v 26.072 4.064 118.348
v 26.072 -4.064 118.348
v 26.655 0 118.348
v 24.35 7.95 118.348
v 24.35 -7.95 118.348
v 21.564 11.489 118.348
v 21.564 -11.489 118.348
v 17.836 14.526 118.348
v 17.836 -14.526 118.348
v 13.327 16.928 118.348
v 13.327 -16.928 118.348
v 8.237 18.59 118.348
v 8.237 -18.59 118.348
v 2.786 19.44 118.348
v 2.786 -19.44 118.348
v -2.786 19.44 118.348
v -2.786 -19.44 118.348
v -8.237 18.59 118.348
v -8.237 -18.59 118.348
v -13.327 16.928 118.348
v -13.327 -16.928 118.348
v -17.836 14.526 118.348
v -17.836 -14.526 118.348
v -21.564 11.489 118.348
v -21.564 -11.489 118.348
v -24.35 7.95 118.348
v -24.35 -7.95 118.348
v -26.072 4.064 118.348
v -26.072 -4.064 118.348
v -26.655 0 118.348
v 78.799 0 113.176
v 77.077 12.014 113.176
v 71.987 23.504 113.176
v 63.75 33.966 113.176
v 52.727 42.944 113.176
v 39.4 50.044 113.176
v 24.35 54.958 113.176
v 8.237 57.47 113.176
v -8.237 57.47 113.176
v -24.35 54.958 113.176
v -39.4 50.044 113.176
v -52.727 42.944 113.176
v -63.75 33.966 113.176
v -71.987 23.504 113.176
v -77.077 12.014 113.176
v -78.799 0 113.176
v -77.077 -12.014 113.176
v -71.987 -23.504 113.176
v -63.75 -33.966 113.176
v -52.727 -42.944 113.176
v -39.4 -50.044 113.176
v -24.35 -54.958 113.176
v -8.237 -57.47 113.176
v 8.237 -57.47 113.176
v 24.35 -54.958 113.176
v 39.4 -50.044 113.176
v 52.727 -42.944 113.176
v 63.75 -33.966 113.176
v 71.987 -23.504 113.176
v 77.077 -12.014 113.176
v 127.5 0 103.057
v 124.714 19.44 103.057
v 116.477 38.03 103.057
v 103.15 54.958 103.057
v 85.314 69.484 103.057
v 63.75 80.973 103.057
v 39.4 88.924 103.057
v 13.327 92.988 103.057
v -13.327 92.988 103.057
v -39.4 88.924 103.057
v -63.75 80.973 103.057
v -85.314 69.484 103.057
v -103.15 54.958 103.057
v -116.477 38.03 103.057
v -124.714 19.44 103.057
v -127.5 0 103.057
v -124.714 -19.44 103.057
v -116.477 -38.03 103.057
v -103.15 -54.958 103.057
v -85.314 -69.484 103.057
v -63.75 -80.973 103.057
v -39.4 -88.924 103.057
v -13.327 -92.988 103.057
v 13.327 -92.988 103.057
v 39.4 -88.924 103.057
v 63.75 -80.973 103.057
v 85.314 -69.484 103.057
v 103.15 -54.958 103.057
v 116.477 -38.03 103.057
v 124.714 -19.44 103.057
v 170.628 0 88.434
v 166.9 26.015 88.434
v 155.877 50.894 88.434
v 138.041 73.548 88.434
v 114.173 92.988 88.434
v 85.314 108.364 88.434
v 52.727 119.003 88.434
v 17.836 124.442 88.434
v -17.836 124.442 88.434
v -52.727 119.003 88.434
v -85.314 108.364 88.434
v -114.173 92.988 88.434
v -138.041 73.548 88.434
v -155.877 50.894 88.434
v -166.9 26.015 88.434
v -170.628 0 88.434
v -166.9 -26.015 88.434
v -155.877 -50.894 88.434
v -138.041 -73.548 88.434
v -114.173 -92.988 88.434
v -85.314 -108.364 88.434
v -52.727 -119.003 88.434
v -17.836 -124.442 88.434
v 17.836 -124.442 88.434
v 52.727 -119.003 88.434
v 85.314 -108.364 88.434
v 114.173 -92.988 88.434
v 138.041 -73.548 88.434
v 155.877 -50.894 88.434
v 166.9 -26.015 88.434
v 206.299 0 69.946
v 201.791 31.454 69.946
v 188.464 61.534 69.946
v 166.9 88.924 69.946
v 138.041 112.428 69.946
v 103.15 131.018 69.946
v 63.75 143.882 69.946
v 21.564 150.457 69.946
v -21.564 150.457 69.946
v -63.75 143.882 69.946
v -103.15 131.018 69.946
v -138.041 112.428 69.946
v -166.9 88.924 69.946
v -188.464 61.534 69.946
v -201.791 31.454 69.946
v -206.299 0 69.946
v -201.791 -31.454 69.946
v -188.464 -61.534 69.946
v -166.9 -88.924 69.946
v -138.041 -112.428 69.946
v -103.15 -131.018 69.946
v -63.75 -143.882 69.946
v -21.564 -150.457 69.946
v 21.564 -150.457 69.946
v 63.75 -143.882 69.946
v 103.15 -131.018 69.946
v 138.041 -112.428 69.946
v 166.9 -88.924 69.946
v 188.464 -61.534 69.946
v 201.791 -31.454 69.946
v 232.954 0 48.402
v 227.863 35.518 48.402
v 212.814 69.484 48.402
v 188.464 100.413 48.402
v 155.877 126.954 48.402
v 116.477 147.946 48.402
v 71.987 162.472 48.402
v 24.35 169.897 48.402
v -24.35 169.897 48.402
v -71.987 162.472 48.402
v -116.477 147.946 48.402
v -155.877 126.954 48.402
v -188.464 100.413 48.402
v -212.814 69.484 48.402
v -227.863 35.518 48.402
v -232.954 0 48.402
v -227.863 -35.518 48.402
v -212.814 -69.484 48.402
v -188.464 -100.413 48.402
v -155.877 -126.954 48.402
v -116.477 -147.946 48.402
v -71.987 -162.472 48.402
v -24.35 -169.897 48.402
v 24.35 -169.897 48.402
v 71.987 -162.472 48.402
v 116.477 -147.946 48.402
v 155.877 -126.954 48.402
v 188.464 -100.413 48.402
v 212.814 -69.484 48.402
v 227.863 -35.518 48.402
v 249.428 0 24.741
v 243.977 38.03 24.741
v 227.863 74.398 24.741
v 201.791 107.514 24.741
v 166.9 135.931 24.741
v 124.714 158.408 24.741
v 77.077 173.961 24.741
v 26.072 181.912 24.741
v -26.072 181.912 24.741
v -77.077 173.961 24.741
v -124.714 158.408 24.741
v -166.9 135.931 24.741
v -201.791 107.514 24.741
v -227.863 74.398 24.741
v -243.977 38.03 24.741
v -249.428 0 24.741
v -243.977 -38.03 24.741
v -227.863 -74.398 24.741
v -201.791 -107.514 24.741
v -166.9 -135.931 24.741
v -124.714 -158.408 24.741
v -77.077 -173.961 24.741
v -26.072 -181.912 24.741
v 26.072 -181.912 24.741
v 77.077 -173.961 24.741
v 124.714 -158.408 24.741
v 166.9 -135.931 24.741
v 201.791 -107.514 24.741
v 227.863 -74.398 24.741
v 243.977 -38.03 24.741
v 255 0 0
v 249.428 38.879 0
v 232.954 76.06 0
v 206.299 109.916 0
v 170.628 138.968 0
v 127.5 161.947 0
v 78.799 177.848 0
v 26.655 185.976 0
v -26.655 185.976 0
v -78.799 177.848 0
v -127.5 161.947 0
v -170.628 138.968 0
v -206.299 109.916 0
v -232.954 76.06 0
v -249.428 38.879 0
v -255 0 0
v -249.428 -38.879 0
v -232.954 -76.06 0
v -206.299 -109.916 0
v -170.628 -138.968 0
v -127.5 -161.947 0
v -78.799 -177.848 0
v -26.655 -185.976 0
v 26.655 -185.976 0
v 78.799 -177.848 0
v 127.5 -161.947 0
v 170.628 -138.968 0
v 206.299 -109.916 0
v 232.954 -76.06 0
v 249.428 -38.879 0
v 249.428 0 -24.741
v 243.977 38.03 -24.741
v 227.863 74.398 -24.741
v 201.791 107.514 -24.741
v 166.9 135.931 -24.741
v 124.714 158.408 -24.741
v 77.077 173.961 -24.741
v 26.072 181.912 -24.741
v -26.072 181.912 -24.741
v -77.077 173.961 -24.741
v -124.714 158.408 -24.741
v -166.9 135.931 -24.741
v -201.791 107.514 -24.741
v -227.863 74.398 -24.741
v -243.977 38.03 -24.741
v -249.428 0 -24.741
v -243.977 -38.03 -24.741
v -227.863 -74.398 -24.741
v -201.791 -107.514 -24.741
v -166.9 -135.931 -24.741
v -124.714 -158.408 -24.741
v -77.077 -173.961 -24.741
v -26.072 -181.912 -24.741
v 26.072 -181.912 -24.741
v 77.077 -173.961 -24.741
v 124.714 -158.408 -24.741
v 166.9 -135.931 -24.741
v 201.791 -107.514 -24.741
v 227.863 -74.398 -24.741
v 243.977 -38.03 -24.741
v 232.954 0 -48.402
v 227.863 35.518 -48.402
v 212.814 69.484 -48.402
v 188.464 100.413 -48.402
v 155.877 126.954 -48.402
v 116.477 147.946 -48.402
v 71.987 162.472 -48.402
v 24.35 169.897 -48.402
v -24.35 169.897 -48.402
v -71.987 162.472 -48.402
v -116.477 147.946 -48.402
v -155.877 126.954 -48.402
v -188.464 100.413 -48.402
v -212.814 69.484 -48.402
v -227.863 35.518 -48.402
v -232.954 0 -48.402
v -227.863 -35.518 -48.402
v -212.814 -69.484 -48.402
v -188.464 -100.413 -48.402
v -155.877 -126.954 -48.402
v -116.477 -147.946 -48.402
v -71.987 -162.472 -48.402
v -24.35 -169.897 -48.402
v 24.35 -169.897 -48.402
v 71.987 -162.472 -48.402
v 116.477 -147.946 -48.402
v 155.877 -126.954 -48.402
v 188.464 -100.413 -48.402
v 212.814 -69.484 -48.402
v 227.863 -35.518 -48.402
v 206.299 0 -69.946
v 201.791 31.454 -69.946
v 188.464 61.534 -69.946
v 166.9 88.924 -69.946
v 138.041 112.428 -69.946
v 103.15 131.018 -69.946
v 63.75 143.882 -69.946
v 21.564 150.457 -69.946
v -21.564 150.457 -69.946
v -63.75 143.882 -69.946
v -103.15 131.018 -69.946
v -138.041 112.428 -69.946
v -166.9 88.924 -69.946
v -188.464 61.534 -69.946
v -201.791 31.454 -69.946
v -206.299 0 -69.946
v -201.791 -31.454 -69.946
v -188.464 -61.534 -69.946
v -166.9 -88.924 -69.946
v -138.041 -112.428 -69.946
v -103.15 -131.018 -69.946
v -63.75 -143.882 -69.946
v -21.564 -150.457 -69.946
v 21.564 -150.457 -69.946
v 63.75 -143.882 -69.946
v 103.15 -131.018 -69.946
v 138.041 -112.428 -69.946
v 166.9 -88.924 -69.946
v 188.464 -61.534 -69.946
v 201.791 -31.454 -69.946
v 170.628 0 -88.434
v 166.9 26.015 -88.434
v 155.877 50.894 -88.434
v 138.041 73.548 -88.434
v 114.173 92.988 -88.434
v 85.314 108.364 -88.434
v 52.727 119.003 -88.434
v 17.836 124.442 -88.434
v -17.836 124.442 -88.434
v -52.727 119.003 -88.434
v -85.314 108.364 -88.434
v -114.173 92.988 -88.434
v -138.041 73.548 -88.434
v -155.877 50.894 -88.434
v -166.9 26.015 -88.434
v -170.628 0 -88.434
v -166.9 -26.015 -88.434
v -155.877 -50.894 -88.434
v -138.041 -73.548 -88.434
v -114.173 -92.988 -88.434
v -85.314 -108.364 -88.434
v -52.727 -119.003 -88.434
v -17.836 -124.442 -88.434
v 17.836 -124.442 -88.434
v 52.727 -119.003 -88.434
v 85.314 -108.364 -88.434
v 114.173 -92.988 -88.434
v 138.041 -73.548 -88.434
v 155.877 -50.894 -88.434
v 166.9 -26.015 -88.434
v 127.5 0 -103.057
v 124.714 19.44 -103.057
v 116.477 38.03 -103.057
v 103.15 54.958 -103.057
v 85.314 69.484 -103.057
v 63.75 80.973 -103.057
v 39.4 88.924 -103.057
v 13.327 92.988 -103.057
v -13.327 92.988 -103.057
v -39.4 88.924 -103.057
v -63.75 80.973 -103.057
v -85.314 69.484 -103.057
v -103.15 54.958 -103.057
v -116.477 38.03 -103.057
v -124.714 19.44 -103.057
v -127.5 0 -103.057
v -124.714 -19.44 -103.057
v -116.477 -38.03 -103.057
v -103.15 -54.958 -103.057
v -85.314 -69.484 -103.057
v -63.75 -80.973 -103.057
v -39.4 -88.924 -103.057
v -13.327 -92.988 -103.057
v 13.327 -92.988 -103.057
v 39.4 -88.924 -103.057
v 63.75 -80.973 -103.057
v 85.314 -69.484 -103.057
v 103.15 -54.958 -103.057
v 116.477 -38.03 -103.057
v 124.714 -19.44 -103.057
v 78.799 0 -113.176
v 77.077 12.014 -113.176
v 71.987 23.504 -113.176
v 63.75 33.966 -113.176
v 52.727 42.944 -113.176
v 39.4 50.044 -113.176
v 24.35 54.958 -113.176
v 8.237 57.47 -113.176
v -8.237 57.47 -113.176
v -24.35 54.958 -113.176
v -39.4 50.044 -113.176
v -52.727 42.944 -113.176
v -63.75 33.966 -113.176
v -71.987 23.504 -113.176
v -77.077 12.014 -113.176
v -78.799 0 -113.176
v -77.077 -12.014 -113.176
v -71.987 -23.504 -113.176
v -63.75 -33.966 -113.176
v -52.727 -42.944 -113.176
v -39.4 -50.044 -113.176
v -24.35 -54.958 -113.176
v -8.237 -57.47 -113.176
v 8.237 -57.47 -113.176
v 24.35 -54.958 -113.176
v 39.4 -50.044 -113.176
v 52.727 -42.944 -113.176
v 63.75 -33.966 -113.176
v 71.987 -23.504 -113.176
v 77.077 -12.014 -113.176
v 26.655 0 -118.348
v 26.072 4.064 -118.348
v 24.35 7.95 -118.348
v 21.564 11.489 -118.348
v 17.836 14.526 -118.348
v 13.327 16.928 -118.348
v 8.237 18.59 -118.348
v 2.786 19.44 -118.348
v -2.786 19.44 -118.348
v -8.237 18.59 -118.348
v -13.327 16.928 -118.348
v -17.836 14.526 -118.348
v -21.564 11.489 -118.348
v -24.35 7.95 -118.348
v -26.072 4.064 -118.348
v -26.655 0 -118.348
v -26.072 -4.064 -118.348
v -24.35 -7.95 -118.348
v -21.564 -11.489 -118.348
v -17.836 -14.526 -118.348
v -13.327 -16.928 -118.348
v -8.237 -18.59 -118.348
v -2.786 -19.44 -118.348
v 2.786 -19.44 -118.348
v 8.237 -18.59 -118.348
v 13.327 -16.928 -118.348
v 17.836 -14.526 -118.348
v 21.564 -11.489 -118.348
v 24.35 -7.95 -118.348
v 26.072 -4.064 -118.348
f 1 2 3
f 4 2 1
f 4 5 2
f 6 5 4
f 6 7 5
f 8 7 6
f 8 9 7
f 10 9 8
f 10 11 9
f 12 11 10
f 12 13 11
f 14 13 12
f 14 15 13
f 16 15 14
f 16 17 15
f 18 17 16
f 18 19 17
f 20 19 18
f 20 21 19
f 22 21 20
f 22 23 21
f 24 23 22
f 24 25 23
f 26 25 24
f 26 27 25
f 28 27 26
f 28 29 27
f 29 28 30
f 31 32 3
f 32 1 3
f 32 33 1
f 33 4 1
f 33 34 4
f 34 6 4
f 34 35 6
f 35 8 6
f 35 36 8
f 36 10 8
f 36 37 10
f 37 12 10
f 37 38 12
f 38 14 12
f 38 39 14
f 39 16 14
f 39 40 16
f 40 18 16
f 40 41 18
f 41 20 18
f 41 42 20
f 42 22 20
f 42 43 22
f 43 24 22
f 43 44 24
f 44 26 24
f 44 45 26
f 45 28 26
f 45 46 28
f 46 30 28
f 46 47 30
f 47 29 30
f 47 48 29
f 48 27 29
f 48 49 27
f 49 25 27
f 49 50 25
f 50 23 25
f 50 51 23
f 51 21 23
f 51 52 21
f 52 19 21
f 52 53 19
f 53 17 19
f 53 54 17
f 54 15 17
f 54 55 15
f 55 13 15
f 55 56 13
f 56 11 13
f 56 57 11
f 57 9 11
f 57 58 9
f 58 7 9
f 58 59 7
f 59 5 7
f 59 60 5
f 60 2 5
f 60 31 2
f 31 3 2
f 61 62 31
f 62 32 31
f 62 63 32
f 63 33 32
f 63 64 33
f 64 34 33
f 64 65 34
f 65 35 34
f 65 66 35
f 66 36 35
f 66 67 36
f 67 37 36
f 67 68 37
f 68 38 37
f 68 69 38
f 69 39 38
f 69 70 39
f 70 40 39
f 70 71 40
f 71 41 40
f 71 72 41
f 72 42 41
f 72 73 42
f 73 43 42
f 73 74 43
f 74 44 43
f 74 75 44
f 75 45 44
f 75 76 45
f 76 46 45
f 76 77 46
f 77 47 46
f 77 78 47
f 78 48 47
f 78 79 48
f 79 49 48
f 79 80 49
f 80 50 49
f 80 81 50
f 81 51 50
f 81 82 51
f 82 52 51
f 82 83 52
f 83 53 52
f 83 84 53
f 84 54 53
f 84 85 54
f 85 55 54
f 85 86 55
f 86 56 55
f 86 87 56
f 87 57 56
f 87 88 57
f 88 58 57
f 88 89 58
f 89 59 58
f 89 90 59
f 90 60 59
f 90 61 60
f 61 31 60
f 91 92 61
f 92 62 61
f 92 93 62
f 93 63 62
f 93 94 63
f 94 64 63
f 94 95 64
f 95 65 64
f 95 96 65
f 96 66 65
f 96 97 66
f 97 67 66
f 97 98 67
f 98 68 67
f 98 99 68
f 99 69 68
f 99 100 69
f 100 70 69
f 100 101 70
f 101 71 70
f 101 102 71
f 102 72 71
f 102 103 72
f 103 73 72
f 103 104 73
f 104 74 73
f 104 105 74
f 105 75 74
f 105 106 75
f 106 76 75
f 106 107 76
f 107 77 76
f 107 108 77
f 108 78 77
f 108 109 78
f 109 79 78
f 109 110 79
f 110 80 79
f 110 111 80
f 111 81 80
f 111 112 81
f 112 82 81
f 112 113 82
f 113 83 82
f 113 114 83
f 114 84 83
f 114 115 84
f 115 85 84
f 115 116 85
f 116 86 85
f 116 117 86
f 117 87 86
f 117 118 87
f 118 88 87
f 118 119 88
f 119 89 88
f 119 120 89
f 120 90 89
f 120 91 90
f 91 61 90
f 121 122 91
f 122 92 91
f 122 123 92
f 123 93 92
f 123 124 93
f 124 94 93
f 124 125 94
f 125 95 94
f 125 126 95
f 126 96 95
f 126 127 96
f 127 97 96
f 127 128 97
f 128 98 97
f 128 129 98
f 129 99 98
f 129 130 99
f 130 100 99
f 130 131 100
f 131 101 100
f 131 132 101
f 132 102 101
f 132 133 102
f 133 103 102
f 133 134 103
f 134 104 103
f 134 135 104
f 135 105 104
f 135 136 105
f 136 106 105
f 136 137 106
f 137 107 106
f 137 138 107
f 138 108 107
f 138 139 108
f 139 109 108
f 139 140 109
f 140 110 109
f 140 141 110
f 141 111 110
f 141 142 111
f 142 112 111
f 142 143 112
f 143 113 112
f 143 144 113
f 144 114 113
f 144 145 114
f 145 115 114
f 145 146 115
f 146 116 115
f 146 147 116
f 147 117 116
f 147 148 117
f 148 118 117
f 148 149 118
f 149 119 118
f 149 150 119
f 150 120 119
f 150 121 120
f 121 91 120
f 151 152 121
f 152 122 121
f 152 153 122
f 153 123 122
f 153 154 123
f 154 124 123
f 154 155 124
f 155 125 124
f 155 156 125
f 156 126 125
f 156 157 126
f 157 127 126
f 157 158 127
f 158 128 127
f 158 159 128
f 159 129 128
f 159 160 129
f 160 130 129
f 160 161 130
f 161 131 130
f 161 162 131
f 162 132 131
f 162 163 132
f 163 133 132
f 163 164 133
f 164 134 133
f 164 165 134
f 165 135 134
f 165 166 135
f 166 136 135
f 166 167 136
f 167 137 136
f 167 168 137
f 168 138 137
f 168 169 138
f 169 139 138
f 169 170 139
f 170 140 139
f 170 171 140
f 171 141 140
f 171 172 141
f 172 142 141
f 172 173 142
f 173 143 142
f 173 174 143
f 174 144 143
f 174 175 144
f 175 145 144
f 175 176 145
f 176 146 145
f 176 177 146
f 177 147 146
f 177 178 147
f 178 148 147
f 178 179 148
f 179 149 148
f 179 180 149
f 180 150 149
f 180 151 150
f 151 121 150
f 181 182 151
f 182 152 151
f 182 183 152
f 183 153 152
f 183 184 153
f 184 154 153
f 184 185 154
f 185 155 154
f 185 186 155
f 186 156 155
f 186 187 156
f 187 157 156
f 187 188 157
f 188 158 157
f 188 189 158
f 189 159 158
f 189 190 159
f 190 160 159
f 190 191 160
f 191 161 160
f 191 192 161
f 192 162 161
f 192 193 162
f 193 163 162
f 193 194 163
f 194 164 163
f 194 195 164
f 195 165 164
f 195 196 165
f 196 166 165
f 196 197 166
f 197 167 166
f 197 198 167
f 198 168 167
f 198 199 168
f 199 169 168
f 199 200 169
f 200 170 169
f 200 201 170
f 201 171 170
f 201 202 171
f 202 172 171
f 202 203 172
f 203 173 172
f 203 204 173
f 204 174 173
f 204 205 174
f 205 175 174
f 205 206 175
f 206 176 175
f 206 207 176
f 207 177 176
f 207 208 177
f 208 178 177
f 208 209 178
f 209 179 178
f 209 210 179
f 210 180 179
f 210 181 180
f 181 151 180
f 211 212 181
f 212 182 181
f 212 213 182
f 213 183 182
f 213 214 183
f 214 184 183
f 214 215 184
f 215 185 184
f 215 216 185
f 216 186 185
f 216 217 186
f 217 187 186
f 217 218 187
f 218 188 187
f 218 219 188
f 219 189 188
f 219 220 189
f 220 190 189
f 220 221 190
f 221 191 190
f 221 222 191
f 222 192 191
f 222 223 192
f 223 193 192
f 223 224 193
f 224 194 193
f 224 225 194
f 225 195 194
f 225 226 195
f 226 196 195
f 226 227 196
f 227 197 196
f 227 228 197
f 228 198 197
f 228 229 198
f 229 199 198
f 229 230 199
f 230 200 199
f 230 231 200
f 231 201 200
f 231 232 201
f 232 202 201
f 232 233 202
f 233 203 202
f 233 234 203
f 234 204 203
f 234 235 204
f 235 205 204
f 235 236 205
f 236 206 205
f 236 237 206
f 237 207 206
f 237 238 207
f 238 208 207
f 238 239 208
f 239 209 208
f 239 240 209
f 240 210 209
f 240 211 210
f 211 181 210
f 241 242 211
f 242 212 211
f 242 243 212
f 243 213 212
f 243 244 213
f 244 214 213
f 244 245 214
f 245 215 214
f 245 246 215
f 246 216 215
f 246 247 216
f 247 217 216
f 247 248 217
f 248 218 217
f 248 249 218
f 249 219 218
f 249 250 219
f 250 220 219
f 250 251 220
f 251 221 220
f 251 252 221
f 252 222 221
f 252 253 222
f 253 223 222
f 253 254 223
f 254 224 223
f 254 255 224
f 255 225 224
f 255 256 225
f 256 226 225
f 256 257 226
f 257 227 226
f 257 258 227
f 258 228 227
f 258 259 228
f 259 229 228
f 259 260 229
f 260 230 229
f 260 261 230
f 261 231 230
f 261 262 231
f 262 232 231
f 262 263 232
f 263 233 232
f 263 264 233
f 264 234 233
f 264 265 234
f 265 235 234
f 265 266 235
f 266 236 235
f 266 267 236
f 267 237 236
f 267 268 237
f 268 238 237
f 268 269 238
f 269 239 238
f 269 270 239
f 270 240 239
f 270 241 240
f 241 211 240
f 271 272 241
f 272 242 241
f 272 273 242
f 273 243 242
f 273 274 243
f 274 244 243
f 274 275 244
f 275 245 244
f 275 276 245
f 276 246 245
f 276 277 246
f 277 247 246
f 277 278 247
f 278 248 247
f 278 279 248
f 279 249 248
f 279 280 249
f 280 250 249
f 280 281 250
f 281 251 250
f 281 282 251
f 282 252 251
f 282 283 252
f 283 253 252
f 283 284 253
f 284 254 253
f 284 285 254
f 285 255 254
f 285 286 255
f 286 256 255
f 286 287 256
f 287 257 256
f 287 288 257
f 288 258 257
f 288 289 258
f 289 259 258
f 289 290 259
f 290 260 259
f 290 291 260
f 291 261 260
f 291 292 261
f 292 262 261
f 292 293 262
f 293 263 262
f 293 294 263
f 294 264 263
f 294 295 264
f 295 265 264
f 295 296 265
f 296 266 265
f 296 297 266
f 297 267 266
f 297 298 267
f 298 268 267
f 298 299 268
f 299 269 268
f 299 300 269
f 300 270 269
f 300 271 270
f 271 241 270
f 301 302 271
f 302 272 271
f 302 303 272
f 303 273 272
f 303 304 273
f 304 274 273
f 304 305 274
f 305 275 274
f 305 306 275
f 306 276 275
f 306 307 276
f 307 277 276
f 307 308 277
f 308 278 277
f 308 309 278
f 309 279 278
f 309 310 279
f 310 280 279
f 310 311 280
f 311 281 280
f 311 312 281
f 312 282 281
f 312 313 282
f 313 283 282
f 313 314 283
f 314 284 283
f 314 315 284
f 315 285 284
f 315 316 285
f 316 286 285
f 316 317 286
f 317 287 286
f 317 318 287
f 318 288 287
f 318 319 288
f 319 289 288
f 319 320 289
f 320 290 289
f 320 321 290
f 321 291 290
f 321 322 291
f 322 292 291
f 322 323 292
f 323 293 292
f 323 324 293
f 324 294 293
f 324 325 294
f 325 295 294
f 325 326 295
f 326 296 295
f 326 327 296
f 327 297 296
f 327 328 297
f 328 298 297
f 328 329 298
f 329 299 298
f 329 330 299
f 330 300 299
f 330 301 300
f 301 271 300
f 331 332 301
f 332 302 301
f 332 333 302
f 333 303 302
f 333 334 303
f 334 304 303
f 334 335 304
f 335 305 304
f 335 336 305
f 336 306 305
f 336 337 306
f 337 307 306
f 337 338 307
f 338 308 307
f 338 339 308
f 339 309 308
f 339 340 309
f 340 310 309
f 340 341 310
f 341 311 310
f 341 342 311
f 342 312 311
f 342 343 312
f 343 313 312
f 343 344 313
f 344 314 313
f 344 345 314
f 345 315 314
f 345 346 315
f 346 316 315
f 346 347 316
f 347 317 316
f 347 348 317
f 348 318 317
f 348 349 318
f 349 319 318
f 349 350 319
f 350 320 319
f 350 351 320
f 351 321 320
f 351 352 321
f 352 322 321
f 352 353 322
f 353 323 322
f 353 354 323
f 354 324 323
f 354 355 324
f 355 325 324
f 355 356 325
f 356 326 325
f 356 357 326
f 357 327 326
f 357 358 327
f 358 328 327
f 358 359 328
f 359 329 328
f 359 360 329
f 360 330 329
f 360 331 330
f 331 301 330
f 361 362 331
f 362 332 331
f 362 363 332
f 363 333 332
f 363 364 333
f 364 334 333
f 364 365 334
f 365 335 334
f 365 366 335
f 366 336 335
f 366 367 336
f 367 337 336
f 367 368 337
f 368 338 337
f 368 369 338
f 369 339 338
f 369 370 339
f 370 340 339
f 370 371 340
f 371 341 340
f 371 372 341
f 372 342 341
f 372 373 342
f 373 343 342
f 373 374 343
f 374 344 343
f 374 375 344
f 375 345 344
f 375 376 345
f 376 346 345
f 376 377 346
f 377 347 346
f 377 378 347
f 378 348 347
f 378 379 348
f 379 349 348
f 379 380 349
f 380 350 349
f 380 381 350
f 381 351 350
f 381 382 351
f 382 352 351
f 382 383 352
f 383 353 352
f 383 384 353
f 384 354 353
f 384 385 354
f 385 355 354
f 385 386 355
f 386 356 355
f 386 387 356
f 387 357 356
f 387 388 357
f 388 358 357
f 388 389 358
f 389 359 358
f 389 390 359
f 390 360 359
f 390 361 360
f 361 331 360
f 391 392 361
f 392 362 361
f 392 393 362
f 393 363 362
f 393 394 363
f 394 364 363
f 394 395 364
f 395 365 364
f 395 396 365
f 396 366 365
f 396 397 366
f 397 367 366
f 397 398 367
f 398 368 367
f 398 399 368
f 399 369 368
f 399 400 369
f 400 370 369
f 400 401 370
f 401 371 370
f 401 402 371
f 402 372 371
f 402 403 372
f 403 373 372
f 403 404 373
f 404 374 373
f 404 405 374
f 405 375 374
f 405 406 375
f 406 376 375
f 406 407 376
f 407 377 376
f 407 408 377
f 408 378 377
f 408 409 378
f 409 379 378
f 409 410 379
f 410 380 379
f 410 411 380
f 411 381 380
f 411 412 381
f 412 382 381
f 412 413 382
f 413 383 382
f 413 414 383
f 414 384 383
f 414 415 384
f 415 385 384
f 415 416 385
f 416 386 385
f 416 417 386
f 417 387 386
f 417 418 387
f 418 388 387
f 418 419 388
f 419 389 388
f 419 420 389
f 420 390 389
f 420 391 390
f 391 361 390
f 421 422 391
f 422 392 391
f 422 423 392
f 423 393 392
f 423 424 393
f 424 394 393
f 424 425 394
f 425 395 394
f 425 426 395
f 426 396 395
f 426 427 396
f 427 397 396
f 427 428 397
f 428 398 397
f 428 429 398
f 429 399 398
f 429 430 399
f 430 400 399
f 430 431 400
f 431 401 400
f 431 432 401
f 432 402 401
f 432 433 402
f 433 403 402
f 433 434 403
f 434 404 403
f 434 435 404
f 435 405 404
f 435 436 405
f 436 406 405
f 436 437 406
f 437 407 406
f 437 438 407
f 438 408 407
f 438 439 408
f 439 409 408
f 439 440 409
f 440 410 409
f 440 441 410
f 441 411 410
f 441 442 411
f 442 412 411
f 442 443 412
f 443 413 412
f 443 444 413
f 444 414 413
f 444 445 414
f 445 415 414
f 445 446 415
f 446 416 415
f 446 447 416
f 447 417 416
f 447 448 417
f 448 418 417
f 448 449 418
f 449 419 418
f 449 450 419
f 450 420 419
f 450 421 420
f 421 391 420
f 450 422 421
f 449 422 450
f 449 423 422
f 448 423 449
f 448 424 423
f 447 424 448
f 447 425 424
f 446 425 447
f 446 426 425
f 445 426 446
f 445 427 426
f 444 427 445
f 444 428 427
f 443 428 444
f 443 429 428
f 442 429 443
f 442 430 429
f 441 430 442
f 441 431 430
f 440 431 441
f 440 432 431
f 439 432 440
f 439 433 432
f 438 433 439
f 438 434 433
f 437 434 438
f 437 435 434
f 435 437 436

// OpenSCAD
// Generated by SolidPython 1.0.1 on 2020-07-29 00:46:52


scale(v = [15, 11, 7]) {
	sphere(r = 17);
}
/***********************************************
*********      SolidPython code:      **********
************************************************
 
# import packages: SolidPython
from solid import *
from solid.utils import *
from itertools import chain, combinations, permutations


class Resize:

    def __init__(self, scad_file):
        self.scad_file = scad_file
        #self.scad_file = import_scad(scad_file)
        # cone/cylinder param:
        self.r1 = 0
        self.r2 = 0
        self.h = 0
        # rectangular prism param:
        self.w = 0
        self.l = 0
        # ellipse param:
        self.r = 0

    # import OpenScad code (file name corresponds to shape)


    # classify shape + parameters
    def assign(self, param1, param2, param3):
        if self.scad_file == 'cone.scad':
            self.r1 = param1
            self.r2 = param2
            self.h = param3
        elif self.scad_file == 'cylinder.scad':
            self.r1 = param1
            self.r2 = param2
            self.h = param3
        elif self.scad_file == 'rectangularPrism.scad':
            self.h = param1
            self.l = param2
            self.w = param3
        else:
            self.r = param1
            self.h = param2

    # resize parameters
    def iterate(self):
        x = range(3, 20, 2)
        i = 1
        if self.scad_file == 'cone.scad':
            tempList = list(permutations(x, 2))
            for temp in tempList:
                param1 = temp[0]
                param2 = temp[1]
                filepath = 'produced_scad_files/' + 'cone' + str(param1) + '_' + str(param2) + '_' + '.scad'
                scad_render_to_file(cylinder(h=param1, r1=param2, r2=0), filepath)

        elif self.scad_file == 'cylinder.scad':
            tempList = list(permutations(x, 3))
            for temp in tempList:
                param1 = temp[0]
                param2 = temp[1]
                filepath = 'produced_scad_files/' + 'cylinder' + str(param1) + '_' + str(param2) + '_' + '.scad'
                scad_render_to_file(cylinder(h=param1, r1=param2, r2=param2), filepath)

        elif self.scad_file == 'rectangularPrism.scad':
            tempList = list(permutations(x, 3))
            for temp in tempList:
                param1 = temp[0]
                param2 = temp[1]
                param3 = temp[2]
                filepath = 'produced_scad_files/' + 'rectangularPrism' + str(param1) + '_' + str(param2) + '_' + str(
                    param3) + '.scad'
                scad_render_to_file(cube(size=(param1, param2, param3)), filepath)

        elif self.scad_file == 'ellipse.scad':
            tempList = list(permutations(x, 4))
            for temp in tempList:
                param1 = temp[0]
                param2 = temp[1]
                param3 = temp[2]
                param4 = temp[3]
                filepath = 'produced_scad_files/' + 'ellipse' + str(param1) + '_' + str(param2) + '_' + str(param3) + '_' + str(param4) + '.scad'
                scad_render_to_file(scale([param1, param2, param3])(sphere(r=param4)), filepath)

    def render_to_scadfile(self):
        scad_render_to_file(scad, 'example.scad') 
 
************************************************/
